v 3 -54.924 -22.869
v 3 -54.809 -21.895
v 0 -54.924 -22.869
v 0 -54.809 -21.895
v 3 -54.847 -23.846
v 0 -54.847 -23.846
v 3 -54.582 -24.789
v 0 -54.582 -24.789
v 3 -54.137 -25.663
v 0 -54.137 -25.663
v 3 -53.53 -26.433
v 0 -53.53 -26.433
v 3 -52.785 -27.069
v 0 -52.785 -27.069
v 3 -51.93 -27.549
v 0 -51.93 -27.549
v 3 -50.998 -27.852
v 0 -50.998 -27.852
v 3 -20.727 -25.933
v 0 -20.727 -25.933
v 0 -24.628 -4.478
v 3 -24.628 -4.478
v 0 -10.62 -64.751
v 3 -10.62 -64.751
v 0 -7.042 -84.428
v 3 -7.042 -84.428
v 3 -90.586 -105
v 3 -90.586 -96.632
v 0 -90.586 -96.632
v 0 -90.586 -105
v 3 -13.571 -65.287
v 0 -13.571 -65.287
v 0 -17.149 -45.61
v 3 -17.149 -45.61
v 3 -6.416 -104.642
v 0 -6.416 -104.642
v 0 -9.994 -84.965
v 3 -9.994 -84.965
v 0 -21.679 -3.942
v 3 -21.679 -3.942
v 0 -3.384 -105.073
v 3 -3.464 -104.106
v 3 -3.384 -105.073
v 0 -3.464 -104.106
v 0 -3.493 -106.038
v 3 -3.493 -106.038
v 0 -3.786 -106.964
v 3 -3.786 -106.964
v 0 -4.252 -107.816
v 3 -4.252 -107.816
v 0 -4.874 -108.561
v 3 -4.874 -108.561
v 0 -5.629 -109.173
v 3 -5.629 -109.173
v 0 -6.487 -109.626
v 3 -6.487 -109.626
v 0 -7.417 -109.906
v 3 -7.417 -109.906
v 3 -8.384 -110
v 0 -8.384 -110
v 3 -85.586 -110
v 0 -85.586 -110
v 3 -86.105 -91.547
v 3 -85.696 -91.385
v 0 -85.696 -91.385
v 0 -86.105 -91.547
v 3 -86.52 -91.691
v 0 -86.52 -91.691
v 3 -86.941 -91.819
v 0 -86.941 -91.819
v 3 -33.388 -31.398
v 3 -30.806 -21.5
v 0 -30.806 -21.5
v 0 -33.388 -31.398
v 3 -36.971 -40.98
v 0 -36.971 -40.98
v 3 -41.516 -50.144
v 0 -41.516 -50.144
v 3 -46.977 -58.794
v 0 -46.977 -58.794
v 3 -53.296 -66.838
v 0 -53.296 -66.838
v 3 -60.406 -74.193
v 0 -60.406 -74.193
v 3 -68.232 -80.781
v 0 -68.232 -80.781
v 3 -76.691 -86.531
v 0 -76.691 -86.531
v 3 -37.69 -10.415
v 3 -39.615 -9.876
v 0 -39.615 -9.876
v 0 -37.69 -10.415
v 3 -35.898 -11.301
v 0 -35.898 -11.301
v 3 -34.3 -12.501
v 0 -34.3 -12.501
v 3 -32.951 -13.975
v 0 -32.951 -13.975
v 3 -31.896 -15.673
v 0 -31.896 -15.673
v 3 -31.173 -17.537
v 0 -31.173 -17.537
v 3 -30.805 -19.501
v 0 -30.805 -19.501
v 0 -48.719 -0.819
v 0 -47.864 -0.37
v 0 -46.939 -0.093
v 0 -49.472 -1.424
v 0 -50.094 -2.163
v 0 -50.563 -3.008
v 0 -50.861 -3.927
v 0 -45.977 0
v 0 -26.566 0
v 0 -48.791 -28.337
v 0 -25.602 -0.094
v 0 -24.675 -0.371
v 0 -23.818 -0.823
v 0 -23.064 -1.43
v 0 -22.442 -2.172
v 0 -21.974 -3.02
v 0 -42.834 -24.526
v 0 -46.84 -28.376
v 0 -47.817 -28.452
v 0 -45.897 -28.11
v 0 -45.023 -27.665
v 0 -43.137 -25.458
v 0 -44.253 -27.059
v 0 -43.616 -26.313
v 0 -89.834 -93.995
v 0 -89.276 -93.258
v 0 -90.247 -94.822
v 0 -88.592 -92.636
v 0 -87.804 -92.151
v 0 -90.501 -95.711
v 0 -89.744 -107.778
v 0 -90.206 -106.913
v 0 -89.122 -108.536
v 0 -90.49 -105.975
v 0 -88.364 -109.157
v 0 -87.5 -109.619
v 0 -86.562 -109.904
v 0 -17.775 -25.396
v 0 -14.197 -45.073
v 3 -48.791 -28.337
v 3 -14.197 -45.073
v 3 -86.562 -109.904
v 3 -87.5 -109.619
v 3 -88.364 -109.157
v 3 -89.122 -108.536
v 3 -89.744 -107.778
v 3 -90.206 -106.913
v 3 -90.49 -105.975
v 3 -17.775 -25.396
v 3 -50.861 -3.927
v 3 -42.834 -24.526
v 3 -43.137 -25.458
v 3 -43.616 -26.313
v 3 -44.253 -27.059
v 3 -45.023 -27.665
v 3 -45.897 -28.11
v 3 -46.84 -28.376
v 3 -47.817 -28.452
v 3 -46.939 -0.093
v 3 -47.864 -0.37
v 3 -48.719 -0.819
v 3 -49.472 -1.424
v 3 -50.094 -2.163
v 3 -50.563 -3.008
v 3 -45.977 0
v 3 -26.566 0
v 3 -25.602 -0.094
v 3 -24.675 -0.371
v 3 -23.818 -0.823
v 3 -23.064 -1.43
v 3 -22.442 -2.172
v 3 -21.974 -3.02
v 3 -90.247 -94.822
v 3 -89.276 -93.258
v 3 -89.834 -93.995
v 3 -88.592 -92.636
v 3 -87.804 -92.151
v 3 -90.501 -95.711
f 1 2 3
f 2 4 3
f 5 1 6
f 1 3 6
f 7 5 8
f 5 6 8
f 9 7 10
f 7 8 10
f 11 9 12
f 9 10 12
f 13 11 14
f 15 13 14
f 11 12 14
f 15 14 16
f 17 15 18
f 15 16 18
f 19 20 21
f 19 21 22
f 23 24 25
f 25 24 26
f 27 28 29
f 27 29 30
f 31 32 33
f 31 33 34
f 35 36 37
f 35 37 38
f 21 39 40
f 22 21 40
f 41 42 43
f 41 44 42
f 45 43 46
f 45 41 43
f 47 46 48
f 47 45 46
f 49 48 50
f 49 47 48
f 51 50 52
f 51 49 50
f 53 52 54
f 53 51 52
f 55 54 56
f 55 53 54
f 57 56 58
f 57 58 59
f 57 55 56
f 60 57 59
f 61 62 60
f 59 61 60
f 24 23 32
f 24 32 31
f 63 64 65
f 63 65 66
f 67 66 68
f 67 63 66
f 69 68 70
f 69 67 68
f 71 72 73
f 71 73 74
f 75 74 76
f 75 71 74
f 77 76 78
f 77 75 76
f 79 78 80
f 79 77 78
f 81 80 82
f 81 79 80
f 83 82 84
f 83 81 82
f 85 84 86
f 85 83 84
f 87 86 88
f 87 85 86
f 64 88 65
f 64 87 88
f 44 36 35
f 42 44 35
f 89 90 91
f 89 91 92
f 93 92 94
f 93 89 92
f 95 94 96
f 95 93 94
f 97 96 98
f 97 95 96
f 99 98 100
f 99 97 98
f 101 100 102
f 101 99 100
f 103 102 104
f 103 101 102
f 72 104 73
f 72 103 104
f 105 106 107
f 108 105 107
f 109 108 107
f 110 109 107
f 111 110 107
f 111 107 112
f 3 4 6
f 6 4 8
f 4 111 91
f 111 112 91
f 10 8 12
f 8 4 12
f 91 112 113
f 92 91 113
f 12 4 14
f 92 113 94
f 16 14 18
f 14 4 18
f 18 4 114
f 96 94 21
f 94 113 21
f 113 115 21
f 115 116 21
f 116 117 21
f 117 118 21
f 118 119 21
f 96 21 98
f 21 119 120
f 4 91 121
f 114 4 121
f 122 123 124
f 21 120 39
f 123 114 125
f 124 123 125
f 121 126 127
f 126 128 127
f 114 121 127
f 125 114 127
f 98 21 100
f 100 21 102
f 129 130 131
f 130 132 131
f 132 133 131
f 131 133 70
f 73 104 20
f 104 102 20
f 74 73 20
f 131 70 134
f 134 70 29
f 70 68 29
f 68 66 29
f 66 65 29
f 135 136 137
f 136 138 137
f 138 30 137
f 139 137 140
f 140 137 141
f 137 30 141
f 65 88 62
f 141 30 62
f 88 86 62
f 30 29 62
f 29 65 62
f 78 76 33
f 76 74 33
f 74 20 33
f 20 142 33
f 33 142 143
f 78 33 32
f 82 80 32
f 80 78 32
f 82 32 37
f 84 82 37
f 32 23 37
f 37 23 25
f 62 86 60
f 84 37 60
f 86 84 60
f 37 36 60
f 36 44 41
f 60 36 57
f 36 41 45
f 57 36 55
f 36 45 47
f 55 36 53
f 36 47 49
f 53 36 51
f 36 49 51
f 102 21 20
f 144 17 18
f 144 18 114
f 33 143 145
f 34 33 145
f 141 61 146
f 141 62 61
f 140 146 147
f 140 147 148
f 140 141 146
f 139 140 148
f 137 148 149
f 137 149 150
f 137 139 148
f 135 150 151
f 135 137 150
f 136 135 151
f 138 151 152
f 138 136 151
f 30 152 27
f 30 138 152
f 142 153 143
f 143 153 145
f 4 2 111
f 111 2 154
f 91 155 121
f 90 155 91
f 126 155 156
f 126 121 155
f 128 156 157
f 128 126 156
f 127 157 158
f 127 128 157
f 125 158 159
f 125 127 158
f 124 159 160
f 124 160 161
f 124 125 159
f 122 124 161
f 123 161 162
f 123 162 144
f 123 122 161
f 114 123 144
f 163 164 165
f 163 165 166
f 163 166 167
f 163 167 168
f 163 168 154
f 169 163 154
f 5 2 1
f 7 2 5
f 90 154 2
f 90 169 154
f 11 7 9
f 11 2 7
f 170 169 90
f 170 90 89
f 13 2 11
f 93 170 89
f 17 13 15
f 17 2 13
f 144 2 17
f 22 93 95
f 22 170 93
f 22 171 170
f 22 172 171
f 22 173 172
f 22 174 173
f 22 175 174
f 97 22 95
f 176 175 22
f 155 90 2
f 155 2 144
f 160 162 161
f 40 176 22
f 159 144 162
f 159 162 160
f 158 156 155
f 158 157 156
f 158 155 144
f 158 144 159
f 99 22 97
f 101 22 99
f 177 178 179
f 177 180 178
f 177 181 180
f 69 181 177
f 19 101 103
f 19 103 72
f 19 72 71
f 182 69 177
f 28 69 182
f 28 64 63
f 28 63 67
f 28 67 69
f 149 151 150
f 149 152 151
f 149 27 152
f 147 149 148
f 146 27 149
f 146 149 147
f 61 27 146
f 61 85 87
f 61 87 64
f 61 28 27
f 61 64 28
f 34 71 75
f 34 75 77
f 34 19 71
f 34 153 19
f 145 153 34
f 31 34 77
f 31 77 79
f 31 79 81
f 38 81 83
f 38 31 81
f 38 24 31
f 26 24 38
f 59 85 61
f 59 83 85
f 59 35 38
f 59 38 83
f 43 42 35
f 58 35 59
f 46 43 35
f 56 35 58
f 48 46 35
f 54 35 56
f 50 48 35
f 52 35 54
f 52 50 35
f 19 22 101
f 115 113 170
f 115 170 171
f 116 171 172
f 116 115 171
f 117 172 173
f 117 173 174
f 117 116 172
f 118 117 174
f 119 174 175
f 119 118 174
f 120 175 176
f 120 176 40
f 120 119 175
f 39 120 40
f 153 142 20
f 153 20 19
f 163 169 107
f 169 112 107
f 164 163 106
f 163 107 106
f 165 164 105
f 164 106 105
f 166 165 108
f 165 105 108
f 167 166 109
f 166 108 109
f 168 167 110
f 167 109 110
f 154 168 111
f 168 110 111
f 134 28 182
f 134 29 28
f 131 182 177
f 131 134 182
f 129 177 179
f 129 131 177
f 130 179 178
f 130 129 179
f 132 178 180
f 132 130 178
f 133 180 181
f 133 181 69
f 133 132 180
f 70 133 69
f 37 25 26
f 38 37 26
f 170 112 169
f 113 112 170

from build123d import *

# Parameters (mm, degrees)
SKETCH1_W           = 110
SKETCH1_H           = 110
BOSS_EXTRUDE1_DEPTH = 3
CUT_EXTRUDE1_DEPTH  = 10
CUT_EXTRUDE2_DEPTH  = 10
CUT_EXTRUDE3_DEPTH  = 10
FILLET1_R           = 5
SKETCH5_W           = 3
SKETCH5_H           = 20
SKETCH5_H_2         = 21.80661572
CUT_EXTRUDE4_DEPTH  = 3


with BuildPart() as part:
    # Sketch1 → Boss-Extrude1 (new body)
    with BuildSketch(Plane(origin=(0, 0, 0), x_dir=(0, 0, -1), z_dir=(1, 0, 0))):
        with Locations((55, -55)):
            Rectangle(SKETCH1_W, SKETCH1_H)
    extrude(amount=BOSS_EXTRUDE1_DEPTH)

    # Sketch2 → Cut-Extrude1 (cut)
    with BuildSketch(Plane(origin=(3, 0, 0), x_dir=(0, 0, -1), z_dir=(1, 0, 0))):
        with BuildLine():
            Line((26.778826095, -55.88152198), (29.40983865, -43.907010607))
            Line((29.40983865, -43.907010607), (9.875793007, -39.61503428))
            ThreePointArc((9.875793007, -39.61503428), (13.975453089, -32.950696648), (21.500097135, -30.80585613))
            ThreePointArc((21.500097135, -30.80585613), (62.897028718, -50.033250753), (91.384991868, -85.69604094))
            ThreePointArc((91.384991868, -85.69604094), (92.19972432, -90.586303718), (90.744288497, -95.325519429))
            Line((90.744288497, -95.325519429), (80.864556452, -107.820216293))
            Line((80.864556452, -107.820216293), (79.448988361, -110))
            Line((79.448988361, -110), (0, -110))
            Line((0, -110), (0, -69.727563309))
            Line((0, -69.727563309), (3.14357432, -66.357579934))
            ThreePointArc((3.14357432, -66.357579934), (4.130318316, -65.093257024), (4.613767896, -63.564057026))
            Line((4.613767896, -63.564057026), (24.14781354, -67.856033353))
            Line((24.14781354, -67.856033353), (26.778826095, -55.88152198))
        make_face()
    extrude(amount=-CUT_EXTRUDE1_DEPTH, mode=Mode.SUBTRACT)

    # Sketch3 → Cut-Extrude2 (cut)
    with BuildSketch(Plane(origin=(3, 0, 0), x_dir=(0, 0, -1), z_dir=(1, 0, 0))):
        Polygon((26.778826095, -55.88152198), (0, -49.997738878), (0, -22.392653141), (110, -2.392653141), (110, 0), (0, 0), (-15.446531008, -25.16825398), (-7.23919485, -70.308602848), (0, -69.727563309), (28.662258875, -73.688951531), (31.123409687, -55.88152198), align=None)
    extrude(amount=-CUT_EXTRUDE2_DEPTH, mode=Mode.SUBTRACT)

    # Sketch4 → Cut-Extrude3 (cut)
    with BuildSketch(Plane(origin=(3, 0, 0), x_dir=(0, 0, -1), z_dir=(1, 0, 0))):
        Polygon((92.19972432, -90.586303718), (110, -90.586303718), (115.849676558, -112.577173273), (92.19972432, -118.868173766), (68.110039343, -115.722673519), (77.620590823, -97.250185318), align=None)
    extrude(amount=-CUT_EXTRUDE3_DEPTH, mode=Mode.SUBTRACT)

    # Fillet1
    fillet1_edges = [part.edges().sort_by_distance(p)[0] for p in [
        (1.5, -90.586303718, -92.19972432),
        (1.5, -90.586303718, -110),
        (1.5, -43.907010607, -29.40983865),
        (1.5, -55.88152198, -26.778826095),
        (1.5, -2.392653141, -110),
        (1.5, -22.392653141, 0),
        (1.5, -49.997738878, 0),
    ]]
    fillet(fillet1_edges, radius=FILLET1_R)

    # Sketch5 → Cut-Extrude4 (cut)
    with BuildSketch(Plane(origin=(0, -21.676088241, -3.941106953), x_dir=(1, 0, 0), z_dir=(0, 0.9838699100999075, 0.17888543819998315))):
        with Locations((1.5, 91.80661572)):
            Rectangle(SKETCH5_W, SKETCH5_H)
        with Locations((1.5, 51.80661572)):
            Rectangle(SKETCH5_W, SKETCH5_H)
        with Locations((1.5, 10.90330786)):
            Rectangle(SKETCH5_W, SKETCH5_H_2)
    extrude(amount=-CUT_EXTRUDE4_DEPTH, mode=Mode.SUBTRACT)


solid = part.part
